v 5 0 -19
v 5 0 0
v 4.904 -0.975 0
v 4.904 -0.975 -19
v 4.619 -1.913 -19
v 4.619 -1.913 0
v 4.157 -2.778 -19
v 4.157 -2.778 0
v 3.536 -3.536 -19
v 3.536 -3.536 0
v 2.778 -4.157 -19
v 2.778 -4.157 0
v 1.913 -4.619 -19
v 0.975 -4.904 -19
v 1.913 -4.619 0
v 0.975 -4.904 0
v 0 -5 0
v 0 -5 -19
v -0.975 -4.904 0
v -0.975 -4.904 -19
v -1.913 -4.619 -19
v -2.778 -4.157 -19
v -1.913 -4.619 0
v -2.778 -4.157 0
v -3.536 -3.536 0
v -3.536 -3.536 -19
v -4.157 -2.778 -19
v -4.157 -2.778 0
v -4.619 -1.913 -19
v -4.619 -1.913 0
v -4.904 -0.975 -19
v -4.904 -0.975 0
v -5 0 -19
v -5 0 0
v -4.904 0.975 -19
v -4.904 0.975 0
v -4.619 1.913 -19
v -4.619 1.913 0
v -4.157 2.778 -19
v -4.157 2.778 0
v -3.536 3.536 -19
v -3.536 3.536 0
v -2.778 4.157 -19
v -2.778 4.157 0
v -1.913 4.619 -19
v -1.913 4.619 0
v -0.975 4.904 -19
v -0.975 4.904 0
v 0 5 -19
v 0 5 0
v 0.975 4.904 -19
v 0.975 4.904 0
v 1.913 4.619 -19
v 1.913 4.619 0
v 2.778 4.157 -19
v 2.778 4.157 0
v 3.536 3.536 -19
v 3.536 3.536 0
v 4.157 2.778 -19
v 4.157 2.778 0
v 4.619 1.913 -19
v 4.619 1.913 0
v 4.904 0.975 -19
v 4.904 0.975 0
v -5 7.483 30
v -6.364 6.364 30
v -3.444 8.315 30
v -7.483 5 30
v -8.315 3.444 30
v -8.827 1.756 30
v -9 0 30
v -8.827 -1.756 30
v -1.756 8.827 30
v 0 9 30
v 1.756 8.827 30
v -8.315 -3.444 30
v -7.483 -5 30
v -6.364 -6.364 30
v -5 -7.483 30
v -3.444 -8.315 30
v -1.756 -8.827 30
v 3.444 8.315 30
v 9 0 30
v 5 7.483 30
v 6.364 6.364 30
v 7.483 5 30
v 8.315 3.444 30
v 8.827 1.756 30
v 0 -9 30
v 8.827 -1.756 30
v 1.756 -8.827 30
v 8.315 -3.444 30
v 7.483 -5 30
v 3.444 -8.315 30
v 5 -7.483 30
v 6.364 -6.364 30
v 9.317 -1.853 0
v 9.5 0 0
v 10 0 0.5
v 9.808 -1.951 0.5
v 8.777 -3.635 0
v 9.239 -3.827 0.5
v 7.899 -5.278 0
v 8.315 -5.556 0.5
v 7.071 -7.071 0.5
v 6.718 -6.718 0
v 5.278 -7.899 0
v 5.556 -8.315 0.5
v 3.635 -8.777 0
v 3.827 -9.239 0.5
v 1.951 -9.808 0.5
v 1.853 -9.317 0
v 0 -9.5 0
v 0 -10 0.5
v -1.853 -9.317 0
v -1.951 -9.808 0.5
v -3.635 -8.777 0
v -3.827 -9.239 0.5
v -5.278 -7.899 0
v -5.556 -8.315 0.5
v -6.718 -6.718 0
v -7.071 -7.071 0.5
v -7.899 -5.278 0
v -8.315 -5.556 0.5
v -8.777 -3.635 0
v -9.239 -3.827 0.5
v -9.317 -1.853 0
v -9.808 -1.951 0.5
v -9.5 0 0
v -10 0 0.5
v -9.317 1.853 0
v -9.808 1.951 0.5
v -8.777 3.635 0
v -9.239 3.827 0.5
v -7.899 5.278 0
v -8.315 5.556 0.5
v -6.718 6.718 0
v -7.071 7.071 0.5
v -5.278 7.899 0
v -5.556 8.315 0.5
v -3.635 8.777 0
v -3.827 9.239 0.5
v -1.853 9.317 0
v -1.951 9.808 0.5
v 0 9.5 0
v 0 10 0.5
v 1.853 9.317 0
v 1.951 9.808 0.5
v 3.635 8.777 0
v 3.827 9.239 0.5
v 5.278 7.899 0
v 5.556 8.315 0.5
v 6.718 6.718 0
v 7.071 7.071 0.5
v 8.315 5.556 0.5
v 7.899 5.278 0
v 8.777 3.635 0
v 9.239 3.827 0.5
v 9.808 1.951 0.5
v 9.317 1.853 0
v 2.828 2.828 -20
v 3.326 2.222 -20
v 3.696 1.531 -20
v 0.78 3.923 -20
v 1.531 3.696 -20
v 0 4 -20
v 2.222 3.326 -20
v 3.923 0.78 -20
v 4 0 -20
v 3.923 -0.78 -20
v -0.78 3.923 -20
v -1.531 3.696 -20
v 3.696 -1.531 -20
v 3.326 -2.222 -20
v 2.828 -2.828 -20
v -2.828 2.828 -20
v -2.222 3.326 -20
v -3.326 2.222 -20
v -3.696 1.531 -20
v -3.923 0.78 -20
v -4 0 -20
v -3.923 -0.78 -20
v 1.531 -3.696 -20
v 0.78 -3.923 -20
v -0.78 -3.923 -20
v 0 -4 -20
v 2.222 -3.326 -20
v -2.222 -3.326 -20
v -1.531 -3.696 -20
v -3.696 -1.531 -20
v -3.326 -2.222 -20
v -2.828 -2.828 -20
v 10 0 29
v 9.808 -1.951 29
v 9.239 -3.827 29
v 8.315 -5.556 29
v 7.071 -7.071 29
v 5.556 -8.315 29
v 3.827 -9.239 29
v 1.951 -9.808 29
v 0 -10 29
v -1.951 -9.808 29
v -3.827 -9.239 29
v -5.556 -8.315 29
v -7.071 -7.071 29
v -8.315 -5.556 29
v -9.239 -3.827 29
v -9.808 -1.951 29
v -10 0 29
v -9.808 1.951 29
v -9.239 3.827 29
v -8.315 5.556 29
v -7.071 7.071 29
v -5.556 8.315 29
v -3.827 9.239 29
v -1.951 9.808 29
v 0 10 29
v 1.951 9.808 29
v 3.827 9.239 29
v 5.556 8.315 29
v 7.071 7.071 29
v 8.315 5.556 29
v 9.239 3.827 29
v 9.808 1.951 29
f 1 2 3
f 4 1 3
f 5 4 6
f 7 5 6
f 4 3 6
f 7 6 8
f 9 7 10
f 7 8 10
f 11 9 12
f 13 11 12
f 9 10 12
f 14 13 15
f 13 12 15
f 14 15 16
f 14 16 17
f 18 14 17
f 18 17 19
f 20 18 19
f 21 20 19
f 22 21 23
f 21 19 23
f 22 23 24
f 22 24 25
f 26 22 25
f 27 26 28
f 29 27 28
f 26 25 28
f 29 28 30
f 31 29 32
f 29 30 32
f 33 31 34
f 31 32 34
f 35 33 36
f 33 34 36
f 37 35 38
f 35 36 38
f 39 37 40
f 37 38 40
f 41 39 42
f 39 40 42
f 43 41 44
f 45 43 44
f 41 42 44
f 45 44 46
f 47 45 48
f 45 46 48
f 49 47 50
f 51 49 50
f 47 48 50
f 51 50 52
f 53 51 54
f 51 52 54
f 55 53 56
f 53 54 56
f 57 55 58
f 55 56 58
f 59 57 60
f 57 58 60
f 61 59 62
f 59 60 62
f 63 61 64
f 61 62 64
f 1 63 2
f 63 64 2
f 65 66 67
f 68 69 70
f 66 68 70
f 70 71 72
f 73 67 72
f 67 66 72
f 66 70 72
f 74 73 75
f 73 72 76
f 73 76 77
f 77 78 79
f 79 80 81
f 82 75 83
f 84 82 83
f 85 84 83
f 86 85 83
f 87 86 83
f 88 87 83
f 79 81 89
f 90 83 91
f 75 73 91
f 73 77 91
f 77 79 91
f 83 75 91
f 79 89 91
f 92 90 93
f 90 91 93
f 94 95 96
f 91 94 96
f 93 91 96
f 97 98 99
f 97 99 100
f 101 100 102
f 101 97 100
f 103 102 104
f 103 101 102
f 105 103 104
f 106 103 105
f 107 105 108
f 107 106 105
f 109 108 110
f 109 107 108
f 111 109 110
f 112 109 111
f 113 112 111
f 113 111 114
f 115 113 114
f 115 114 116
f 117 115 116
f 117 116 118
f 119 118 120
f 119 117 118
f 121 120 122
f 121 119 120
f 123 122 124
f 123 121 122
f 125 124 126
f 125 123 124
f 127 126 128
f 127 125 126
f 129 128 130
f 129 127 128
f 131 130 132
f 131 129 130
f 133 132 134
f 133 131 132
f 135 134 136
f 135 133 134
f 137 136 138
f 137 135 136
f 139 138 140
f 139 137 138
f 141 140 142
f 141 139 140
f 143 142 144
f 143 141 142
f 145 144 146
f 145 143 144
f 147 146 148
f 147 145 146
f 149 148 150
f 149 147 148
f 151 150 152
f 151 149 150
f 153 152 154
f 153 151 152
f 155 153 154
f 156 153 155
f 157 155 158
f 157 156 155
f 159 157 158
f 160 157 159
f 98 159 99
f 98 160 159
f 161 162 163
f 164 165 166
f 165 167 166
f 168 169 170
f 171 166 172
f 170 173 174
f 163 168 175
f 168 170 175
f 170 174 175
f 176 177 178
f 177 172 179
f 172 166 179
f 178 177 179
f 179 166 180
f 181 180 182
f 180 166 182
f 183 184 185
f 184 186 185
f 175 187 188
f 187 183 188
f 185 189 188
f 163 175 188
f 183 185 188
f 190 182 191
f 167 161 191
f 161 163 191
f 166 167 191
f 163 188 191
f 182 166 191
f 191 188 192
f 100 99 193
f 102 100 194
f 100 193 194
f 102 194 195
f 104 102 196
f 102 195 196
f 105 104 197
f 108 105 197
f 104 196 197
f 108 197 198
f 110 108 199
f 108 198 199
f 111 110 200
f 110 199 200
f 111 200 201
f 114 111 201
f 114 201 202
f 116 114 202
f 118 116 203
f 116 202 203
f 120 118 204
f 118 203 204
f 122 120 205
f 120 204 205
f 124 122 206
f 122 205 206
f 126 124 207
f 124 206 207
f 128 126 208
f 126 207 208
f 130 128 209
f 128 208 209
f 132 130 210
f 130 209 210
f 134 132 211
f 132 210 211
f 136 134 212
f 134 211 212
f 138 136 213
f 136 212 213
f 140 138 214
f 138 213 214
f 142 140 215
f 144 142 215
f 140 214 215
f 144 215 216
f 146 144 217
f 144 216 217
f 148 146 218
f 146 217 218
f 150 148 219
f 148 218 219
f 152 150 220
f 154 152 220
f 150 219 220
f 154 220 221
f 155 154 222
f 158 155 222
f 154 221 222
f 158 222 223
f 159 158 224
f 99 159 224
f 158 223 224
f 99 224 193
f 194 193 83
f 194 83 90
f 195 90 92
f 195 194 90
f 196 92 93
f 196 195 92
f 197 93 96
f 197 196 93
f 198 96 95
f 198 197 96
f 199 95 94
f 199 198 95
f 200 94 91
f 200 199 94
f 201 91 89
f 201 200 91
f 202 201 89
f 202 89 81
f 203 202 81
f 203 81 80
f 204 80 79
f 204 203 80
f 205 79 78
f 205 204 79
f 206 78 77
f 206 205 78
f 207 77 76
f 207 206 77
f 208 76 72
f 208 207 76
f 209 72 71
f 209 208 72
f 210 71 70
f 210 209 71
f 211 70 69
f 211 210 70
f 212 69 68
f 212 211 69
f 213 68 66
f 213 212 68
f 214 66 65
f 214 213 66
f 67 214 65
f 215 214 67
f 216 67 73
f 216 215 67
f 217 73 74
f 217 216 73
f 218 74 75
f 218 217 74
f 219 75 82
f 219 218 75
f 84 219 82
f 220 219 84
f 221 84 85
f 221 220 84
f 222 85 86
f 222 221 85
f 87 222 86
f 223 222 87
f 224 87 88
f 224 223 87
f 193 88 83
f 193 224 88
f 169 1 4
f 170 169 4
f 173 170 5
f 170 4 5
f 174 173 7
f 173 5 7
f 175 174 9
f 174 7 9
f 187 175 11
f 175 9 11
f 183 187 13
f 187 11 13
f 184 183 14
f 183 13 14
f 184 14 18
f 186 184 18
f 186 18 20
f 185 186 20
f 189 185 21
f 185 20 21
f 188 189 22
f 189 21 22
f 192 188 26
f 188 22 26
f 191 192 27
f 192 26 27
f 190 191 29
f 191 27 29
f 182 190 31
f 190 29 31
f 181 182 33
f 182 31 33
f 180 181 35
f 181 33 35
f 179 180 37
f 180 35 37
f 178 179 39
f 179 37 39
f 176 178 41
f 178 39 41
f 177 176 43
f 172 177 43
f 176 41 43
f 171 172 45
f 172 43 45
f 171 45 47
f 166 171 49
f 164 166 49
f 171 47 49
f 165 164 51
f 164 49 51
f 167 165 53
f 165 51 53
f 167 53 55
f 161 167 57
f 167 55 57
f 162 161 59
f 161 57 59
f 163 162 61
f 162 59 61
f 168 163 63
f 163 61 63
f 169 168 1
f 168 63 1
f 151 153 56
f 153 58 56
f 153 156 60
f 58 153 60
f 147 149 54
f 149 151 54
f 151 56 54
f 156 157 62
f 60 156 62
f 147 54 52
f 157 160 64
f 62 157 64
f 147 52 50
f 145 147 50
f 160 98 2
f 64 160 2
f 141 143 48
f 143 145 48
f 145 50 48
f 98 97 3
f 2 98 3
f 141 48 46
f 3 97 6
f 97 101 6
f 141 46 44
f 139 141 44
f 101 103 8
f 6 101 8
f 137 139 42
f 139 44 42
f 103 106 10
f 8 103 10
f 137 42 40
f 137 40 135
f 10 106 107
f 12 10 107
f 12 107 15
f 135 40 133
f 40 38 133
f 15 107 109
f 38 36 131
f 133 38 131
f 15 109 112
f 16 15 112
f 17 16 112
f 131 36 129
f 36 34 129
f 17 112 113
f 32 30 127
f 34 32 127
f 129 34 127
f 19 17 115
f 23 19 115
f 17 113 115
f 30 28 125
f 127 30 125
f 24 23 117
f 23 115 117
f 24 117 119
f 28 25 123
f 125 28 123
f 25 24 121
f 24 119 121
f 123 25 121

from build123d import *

# Parameters (mm, degrees)
F2_SIZE = 1
F3_SIZE = 0.5


with BuildPart() as f1:
    # F0 (on Front) → F1 (revolve)
    with BuildSketch(Plane.XZ):
        Polygon((10, 30), (0, 30), (0, -20), (5, -20), (5, 0), (10, 0), align=None)
    revolve(axis=Axis((0, 0, 5), (0, 0, -1)))

    # F2
    f2_edges = [f1.edges().sort_by_distance(p)[0] for p in [
        (-10, 0, 30),
        (-5, 0, -20),
    ]]
    chamfer(f2_edges, length=F2_SIZE)

    # F3
    f3_edges = [f1.edges().sort_by_distance(p)[0] for p in [
        (-10, 0, 0),
    ]]
    chamfer(f3_edges, length=F3_SIZE)


solid = f1.part
